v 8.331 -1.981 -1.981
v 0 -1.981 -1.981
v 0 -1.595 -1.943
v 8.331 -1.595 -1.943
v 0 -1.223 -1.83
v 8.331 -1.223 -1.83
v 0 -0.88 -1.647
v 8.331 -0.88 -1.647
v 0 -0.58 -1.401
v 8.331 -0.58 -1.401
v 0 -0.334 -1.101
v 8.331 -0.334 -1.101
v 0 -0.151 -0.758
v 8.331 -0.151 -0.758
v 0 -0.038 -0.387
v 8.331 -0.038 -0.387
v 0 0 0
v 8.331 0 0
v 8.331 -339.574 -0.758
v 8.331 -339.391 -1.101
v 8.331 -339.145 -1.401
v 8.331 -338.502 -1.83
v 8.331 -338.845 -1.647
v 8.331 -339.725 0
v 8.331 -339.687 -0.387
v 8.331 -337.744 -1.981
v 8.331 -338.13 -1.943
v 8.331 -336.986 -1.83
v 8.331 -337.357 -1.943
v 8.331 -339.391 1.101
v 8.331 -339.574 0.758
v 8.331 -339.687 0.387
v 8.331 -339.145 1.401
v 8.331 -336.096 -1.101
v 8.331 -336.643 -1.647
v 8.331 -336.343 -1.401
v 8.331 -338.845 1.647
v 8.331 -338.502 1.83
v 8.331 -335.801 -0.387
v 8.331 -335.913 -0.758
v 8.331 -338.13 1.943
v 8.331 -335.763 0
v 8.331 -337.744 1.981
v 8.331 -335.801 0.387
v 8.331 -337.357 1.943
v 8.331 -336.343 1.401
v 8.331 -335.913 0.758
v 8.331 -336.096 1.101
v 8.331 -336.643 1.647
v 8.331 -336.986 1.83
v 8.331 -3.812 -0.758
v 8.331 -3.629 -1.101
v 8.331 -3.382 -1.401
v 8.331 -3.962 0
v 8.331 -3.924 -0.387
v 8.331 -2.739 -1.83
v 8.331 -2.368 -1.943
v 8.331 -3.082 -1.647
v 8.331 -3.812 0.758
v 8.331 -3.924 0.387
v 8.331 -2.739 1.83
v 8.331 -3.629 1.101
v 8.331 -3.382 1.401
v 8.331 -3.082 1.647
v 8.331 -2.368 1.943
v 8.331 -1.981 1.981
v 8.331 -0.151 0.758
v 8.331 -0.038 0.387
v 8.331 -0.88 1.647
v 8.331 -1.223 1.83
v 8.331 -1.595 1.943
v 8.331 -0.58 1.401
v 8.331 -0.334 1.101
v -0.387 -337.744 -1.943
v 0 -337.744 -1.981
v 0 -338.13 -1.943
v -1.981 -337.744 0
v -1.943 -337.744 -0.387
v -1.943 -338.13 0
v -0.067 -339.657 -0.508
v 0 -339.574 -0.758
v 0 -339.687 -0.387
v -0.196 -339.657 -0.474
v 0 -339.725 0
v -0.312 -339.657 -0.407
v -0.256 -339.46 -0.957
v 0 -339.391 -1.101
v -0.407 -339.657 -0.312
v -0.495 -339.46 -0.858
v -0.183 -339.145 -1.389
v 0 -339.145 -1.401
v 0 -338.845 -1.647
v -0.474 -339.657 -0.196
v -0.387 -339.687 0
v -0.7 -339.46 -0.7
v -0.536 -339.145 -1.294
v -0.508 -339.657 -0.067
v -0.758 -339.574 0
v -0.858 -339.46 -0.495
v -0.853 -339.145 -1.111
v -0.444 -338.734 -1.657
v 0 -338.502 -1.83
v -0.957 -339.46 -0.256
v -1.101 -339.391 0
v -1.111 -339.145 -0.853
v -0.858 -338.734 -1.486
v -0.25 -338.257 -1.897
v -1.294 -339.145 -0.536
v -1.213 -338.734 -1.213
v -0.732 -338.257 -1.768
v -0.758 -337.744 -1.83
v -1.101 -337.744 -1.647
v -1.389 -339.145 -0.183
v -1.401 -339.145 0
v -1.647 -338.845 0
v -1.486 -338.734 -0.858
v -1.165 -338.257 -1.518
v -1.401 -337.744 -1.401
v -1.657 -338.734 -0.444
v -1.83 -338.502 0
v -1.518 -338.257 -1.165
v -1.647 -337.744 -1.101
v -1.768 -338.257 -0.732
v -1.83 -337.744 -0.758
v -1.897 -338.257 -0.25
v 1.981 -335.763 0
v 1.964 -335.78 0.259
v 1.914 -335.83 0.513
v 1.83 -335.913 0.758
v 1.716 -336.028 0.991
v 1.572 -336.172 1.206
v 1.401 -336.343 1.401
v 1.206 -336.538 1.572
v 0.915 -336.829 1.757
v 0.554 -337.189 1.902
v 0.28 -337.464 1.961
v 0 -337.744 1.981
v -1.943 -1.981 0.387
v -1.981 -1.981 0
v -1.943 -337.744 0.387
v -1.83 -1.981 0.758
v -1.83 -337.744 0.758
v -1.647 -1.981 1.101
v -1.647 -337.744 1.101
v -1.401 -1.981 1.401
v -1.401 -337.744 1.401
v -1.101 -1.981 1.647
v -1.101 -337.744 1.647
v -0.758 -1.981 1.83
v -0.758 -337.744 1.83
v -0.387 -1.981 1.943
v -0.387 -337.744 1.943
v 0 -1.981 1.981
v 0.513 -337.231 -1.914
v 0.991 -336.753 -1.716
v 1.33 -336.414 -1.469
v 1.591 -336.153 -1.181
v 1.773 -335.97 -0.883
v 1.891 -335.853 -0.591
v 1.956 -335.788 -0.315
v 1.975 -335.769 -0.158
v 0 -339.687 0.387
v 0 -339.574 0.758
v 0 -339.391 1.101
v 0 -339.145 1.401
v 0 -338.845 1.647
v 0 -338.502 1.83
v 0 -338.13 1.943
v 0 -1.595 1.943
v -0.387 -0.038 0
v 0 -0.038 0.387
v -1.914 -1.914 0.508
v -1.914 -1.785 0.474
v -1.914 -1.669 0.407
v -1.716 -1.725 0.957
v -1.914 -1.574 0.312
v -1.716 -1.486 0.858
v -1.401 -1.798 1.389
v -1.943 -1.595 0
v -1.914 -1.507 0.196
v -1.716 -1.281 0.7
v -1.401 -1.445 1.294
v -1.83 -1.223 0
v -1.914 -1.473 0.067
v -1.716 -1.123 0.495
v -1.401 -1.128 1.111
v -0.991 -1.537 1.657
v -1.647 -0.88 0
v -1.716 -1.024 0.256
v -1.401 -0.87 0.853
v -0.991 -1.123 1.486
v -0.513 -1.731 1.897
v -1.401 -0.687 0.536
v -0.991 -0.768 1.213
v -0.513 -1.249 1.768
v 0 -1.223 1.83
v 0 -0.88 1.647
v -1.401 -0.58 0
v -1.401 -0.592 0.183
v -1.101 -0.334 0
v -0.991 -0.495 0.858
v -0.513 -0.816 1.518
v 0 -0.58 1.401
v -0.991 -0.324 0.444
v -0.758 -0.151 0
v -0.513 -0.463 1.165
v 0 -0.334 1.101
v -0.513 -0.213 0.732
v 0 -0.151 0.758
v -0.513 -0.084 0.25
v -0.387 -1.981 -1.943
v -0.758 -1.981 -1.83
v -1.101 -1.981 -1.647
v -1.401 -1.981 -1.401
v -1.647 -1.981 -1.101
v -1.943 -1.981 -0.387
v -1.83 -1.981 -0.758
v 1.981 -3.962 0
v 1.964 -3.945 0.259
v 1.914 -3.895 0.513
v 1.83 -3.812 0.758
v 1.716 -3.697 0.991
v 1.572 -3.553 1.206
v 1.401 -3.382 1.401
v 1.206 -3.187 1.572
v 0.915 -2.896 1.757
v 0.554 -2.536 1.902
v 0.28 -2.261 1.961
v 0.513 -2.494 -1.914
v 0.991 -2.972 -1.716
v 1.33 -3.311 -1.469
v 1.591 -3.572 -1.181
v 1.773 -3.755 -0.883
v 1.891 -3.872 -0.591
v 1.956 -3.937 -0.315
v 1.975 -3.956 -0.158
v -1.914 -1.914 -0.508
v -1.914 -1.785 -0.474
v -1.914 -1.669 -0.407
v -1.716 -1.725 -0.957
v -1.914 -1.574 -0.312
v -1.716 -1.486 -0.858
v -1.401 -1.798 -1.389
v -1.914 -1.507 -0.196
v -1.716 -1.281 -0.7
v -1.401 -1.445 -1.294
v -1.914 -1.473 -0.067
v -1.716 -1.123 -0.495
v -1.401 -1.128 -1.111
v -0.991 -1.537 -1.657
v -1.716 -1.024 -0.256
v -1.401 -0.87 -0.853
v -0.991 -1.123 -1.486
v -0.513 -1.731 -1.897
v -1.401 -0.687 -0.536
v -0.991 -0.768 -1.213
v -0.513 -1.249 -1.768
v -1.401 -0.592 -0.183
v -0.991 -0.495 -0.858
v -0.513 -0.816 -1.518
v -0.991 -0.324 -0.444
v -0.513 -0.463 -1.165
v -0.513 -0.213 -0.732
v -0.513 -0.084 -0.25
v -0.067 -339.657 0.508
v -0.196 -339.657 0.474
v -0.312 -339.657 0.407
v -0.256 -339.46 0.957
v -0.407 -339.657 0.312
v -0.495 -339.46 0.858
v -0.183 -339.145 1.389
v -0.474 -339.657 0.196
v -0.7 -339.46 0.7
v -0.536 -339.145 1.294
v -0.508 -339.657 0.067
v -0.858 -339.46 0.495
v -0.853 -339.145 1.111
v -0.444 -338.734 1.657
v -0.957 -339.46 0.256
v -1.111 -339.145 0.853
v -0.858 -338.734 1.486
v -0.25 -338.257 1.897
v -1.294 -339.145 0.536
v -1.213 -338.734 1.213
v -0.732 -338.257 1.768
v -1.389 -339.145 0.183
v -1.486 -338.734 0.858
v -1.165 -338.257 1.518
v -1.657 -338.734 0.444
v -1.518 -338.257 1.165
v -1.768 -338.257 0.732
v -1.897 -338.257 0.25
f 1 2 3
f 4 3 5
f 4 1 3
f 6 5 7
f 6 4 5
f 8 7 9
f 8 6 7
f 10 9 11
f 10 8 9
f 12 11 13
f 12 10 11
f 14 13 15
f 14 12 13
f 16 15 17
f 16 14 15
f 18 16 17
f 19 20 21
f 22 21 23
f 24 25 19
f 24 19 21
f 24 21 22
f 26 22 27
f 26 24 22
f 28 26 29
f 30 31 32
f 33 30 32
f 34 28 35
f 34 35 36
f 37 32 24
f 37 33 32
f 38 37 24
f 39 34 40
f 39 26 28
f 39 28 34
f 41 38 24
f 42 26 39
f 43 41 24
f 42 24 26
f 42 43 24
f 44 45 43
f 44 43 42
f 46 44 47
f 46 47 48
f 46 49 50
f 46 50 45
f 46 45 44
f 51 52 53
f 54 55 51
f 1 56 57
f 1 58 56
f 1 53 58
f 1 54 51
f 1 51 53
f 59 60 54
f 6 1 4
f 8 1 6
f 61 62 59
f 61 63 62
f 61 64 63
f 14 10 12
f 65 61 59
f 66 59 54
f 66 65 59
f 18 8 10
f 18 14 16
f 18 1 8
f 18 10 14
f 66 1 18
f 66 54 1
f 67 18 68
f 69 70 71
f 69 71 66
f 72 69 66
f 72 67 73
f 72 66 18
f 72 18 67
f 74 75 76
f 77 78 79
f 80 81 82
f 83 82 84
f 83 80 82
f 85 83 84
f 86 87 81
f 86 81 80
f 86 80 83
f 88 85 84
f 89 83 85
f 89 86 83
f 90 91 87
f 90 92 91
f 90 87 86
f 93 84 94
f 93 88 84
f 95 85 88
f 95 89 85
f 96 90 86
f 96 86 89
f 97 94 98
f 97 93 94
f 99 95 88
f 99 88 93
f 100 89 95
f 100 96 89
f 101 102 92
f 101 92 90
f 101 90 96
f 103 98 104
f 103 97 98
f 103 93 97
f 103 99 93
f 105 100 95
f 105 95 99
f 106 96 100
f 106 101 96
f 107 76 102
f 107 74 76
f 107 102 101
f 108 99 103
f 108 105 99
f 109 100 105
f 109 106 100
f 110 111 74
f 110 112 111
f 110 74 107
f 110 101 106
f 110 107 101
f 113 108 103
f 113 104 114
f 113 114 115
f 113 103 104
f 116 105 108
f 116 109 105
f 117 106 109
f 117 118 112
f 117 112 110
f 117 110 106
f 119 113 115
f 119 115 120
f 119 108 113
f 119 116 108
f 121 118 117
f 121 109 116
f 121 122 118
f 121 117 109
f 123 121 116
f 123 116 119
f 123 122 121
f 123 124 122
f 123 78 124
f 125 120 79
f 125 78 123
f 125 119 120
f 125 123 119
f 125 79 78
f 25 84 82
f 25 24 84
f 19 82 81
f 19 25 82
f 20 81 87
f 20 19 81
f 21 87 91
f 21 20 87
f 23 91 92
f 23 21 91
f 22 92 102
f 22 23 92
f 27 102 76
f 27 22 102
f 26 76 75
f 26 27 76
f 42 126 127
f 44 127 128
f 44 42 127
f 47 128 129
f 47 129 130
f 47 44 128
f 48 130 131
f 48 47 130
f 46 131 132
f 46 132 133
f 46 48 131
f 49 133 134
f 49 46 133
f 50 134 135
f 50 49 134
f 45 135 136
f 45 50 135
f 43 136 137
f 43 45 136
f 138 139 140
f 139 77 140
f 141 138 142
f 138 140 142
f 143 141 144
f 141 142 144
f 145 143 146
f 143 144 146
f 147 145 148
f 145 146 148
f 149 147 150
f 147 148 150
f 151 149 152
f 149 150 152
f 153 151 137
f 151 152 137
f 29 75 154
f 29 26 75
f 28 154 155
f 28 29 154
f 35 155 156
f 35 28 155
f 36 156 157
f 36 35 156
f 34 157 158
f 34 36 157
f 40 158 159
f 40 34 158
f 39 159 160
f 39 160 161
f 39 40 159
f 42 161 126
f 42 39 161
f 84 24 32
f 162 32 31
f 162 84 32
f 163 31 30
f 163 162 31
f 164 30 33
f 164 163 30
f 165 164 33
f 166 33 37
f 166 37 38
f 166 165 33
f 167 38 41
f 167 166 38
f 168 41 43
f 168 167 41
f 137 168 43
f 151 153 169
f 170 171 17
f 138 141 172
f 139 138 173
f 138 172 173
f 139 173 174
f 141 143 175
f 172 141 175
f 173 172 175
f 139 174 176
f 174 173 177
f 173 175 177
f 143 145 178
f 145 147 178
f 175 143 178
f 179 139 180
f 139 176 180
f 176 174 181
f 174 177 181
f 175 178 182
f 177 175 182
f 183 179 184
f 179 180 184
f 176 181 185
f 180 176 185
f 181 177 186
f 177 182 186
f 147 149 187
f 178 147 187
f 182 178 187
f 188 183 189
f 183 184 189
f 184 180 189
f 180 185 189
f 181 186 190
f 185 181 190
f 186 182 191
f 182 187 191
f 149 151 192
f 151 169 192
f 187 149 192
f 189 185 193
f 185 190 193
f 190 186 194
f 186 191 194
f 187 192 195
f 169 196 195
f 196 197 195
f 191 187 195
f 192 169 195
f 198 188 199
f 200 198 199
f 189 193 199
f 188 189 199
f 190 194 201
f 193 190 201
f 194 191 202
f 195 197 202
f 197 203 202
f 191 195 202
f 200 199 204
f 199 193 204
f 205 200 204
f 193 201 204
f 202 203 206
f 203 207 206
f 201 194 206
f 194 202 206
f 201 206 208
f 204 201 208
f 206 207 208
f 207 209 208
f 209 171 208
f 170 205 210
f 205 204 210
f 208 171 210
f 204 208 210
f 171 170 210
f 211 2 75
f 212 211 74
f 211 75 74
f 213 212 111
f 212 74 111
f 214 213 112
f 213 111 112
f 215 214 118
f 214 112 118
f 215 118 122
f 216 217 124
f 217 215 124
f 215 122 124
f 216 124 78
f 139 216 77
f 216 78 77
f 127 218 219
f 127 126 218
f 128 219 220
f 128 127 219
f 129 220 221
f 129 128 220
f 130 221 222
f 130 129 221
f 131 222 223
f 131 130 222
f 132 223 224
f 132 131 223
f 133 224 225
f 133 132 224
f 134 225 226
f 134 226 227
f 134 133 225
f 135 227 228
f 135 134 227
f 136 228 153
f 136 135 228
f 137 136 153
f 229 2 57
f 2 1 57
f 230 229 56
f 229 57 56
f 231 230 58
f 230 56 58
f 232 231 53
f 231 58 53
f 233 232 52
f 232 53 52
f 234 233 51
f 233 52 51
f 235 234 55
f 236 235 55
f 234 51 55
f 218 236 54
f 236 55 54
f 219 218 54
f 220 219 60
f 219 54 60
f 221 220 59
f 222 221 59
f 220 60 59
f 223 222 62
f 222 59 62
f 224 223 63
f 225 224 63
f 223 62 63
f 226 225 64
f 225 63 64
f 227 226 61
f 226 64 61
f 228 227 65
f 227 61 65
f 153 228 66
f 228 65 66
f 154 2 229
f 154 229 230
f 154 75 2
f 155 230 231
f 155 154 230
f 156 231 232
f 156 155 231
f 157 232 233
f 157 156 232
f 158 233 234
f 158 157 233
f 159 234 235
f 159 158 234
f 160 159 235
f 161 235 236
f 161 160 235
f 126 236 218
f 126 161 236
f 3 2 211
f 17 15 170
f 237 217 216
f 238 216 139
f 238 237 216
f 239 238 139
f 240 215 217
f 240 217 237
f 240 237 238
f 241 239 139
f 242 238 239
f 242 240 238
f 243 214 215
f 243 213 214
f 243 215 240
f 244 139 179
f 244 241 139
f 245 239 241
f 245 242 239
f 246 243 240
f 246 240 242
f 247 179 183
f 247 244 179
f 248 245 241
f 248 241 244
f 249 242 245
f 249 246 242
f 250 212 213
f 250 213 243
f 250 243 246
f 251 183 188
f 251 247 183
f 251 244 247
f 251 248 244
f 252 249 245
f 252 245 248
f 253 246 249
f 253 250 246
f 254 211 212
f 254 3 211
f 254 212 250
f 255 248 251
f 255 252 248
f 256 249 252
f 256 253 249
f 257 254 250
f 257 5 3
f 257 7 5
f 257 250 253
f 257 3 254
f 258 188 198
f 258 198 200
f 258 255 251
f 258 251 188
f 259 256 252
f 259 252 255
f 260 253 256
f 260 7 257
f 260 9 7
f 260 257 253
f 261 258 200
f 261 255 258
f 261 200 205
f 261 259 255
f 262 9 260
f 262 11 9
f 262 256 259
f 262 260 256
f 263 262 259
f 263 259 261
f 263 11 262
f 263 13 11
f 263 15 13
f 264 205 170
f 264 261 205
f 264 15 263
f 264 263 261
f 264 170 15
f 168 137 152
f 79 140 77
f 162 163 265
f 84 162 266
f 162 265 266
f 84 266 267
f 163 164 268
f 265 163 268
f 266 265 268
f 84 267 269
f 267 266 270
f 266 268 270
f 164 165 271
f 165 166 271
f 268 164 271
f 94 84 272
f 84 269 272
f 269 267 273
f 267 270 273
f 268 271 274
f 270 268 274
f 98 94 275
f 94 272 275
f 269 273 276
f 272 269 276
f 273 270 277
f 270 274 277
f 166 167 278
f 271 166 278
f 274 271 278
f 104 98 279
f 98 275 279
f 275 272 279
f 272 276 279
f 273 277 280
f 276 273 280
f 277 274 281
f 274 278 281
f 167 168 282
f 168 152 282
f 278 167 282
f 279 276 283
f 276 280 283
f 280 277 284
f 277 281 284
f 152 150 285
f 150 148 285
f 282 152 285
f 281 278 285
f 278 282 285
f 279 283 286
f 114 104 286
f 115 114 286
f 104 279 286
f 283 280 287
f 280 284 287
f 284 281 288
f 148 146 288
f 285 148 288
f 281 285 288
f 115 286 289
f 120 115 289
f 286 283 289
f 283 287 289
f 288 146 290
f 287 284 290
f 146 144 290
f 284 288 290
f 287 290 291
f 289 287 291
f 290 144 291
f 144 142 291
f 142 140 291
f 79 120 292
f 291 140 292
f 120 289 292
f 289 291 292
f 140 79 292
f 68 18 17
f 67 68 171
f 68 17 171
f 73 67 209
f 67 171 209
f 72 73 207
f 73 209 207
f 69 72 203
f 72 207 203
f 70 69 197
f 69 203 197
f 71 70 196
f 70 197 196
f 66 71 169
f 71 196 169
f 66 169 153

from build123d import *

# Parameters (mm, degrees)
F0_W     = 3.9624
F0_H     = 3.9624
F1_DEPTH = 339.725
F2_W     = 3.9624
F2_H     = 3.9624
F3_DEPTH = 6.35
F4_R     = 1.98119


# Not quite as in the source:
# - a fillet or chamfer is up to 0.001 mm smaller than in the source, because OpenCascade refuses the exact size


with BuildPart() as f1:
    # F0 (on Front) → F1 (new body)
    with BuildSketch(Plane.XZ):
        Rectangle(F0_W, F0_H)
    extrude(amount=F1_DEPTH)

    # F2 (on face) → F3 (join)
    with BuildSketch(Plane.YZ.offset(1.9812)):
        with Locations((-337.7438, 0)):
            Rectangle(F2_W, F2_H)
        with Locations((-1.9812, 0)):
            Rectangle(F2_W, F2_H)
    extrude(amount=F3_DEPTH)

    # F4 (radius 1.9812 in the source; OpenCascade refuses exactly that, so slightly less here)
    f4_edges = [f1.edges().sort_by_distance(p)[0] for p in [
        (3.175, 0, 1.9812),
        (3.175, 0, -1.9812),
        (-1.9812, -169.8625, 1.9812),
        (1.9812, -169.8625, 1.9812),
        (-1.9812, -169.8625, -1.9812),
        (1.9812, -169.8625, -1.9812),
        (-1.9812, 0, 0),
        (3.175, -339.725, 1.9812),
        (3.175, -339.725, -1.9812),
        (-1.9812, -339.725, 0),
        (5.1562, -335.7626, -1.9812),
        (5.1562, -3.9624, -1.9812),
        (5.1562, -335.7626, 1.9812),
        (5.1562, -3.9624, 1.9812),
    ]]
    fillet(f4_edges, radius=F4_R)


solid = f1.part
